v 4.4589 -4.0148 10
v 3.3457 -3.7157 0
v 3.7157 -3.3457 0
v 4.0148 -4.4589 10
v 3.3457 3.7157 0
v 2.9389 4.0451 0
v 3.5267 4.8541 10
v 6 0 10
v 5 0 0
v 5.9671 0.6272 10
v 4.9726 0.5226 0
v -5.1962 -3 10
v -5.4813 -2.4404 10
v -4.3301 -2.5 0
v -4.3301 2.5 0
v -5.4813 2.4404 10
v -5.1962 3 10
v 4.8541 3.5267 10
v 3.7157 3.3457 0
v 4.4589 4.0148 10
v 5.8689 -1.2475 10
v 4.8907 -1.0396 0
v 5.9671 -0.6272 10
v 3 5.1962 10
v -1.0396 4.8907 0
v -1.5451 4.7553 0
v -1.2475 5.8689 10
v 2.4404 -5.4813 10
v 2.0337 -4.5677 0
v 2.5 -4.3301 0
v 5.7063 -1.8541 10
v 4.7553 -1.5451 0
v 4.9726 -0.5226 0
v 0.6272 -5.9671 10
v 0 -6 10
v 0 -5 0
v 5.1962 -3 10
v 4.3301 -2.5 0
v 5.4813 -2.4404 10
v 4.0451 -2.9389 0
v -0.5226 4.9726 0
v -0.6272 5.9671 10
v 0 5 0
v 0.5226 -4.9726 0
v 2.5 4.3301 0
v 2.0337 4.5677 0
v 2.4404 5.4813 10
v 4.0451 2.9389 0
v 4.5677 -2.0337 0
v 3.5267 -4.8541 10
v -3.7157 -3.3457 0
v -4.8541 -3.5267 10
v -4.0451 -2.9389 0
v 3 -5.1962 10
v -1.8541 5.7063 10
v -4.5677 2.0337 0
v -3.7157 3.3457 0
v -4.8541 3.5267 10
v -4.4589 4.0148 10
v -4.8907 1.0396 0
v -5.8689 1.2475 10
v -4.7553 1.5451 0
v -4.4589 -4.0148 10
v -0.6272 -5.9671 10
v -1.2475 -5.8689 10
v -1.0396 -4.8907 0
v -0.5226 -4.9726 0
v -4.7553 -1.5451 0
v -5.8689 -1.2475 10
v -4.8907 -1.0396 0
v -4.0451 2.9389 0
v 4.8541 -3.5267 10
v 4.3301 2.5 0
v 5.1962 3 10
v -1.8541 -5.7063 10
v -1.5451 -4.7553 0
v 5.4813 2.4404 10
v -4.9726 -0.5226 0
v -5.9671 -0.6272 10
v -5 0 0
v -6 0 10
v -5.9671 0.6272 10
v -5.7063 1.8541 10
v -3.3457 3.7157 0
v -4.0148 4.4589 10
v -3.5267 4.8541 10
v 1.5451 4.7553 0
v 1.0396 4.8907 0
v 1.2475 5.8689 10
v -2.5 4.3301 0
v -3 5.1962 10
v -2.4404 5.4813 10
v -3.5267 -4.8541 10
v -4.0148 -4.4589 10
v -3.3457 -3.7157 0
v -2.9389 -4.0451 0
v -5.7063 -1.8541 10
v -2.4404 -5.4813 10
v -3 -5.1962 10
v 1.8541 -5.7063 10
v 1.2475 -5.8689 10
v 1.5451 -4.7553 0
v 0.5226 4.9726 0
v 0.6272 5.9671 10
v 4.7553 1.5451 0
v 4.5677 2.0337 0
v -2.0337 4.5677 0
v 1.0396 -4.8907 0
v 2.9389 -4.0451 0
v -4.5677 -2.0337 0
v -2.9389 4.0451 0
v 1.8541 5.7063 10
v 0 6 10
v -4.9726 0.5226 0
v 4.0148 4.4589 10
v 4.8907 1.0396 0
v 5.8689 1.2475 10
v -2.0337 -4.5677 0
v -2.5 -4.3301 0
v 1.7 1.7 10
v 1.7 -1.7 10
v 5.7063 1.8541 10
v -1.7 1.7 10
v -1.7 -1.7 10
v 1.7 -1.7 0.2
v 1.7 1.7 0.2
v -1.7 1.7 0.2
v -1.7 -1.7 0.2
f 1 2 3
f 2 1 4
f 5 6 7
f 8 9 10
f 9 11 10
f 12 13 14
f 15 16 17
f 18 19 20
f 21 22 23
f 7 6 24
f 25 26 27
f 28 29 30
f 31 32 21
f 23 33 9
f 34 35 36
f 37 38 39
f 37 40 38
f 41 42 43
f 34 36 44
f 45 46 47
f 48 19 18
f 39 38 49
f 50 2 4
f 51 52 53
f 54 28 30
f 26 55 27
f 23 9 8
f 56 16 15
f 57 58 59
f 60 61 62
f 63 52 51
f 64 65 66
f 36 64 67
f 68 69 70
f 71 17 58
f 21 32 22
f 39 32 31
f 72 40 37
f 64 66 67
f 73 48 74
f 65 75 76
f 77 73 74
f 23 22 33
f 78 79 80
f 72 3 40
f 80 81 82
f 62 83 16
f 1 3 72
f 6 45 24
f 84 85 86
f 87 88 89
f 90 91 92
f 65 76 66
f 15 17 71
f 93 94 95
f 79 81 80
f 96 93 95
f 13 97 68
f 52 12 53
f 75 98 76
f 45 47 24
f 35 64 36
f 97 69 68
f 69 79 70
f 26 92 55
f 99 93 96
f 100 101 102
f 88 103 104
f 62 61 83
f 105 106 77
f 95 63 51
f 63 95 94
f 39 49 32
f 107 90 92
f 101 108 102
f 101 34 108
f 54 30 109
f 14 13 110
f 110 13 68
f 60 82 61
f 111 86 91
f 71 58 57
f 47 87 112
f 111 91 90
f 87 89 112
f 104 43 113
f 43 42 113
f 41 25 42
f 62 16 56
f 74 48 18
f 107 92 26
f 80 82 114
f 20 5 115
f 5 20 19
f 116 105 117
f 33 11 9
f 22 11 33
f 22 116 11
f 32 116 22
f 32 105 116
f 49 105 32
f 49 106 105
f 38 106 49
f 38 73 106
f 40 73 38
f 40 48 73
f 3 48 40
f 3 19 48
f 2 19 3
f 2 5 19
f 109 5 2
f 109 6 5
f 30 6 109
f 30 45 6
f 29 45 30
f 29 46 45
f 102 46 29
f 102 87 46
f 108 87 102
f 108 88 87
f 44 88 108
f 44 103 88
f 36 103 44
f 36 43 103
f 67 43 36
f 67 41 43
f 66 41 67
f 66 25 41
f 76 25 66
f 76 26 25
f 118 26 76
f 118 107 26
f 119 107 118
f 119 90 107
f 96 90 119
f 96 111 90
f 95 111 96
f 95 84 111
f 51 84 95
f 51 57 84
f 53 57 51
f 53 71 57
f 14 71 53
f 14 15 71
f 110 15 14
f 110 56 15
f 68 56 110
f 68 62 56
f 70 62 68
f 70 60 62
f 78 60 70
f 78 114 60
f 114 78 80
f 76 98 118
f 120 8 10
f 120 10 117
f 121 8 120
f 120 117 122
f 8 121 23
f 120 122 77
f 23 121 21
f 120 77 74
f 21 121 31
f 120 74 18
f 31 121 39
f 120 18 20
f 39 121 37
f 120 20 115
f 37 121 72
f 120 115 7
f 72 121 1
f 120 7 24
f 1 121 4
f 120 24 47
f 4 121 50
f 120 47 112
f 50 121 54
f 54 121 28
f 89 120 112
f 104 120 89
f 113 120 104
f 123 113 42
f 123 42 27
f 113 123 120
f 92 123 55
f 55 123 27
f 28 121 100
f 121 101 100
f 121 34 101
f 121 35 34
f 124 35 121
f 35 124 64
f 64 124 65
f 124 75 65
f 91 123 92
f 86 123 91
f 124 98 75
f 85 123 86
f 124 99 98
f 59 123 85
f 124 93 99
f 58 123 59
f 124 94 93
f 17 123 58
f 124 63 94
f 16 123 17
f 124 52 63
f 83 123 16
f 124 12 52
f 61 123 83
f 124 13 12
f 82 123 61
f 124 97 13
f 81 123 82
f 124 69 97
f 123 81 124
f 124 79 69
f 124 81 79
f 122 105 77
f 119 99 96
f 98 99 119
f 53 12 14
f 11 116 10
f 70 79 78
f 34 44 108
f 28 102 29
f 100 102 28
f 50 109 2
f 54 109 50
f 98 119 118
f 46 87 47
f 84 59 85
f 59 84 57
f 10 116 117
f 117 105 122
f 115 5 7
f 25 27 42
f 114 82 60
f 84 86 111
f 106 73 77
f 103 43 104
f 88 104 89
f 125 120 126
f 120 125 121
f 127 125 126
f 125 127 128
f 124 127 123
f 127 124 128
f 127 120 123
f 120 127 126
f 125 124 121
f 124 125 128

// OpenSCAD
magnet = 3.4;  // 0.2 tolerance so it can slide in
layer = 0.2;
taper = 2;
dia = 10;
h = 10;

$fn = 60;
difference() {
    cylinder(h=h, d1=dia, d2=dia+taper);
    translate([-magnet/2,-magnet/2,layer]) cube([magnet,magnet,h]);
}
